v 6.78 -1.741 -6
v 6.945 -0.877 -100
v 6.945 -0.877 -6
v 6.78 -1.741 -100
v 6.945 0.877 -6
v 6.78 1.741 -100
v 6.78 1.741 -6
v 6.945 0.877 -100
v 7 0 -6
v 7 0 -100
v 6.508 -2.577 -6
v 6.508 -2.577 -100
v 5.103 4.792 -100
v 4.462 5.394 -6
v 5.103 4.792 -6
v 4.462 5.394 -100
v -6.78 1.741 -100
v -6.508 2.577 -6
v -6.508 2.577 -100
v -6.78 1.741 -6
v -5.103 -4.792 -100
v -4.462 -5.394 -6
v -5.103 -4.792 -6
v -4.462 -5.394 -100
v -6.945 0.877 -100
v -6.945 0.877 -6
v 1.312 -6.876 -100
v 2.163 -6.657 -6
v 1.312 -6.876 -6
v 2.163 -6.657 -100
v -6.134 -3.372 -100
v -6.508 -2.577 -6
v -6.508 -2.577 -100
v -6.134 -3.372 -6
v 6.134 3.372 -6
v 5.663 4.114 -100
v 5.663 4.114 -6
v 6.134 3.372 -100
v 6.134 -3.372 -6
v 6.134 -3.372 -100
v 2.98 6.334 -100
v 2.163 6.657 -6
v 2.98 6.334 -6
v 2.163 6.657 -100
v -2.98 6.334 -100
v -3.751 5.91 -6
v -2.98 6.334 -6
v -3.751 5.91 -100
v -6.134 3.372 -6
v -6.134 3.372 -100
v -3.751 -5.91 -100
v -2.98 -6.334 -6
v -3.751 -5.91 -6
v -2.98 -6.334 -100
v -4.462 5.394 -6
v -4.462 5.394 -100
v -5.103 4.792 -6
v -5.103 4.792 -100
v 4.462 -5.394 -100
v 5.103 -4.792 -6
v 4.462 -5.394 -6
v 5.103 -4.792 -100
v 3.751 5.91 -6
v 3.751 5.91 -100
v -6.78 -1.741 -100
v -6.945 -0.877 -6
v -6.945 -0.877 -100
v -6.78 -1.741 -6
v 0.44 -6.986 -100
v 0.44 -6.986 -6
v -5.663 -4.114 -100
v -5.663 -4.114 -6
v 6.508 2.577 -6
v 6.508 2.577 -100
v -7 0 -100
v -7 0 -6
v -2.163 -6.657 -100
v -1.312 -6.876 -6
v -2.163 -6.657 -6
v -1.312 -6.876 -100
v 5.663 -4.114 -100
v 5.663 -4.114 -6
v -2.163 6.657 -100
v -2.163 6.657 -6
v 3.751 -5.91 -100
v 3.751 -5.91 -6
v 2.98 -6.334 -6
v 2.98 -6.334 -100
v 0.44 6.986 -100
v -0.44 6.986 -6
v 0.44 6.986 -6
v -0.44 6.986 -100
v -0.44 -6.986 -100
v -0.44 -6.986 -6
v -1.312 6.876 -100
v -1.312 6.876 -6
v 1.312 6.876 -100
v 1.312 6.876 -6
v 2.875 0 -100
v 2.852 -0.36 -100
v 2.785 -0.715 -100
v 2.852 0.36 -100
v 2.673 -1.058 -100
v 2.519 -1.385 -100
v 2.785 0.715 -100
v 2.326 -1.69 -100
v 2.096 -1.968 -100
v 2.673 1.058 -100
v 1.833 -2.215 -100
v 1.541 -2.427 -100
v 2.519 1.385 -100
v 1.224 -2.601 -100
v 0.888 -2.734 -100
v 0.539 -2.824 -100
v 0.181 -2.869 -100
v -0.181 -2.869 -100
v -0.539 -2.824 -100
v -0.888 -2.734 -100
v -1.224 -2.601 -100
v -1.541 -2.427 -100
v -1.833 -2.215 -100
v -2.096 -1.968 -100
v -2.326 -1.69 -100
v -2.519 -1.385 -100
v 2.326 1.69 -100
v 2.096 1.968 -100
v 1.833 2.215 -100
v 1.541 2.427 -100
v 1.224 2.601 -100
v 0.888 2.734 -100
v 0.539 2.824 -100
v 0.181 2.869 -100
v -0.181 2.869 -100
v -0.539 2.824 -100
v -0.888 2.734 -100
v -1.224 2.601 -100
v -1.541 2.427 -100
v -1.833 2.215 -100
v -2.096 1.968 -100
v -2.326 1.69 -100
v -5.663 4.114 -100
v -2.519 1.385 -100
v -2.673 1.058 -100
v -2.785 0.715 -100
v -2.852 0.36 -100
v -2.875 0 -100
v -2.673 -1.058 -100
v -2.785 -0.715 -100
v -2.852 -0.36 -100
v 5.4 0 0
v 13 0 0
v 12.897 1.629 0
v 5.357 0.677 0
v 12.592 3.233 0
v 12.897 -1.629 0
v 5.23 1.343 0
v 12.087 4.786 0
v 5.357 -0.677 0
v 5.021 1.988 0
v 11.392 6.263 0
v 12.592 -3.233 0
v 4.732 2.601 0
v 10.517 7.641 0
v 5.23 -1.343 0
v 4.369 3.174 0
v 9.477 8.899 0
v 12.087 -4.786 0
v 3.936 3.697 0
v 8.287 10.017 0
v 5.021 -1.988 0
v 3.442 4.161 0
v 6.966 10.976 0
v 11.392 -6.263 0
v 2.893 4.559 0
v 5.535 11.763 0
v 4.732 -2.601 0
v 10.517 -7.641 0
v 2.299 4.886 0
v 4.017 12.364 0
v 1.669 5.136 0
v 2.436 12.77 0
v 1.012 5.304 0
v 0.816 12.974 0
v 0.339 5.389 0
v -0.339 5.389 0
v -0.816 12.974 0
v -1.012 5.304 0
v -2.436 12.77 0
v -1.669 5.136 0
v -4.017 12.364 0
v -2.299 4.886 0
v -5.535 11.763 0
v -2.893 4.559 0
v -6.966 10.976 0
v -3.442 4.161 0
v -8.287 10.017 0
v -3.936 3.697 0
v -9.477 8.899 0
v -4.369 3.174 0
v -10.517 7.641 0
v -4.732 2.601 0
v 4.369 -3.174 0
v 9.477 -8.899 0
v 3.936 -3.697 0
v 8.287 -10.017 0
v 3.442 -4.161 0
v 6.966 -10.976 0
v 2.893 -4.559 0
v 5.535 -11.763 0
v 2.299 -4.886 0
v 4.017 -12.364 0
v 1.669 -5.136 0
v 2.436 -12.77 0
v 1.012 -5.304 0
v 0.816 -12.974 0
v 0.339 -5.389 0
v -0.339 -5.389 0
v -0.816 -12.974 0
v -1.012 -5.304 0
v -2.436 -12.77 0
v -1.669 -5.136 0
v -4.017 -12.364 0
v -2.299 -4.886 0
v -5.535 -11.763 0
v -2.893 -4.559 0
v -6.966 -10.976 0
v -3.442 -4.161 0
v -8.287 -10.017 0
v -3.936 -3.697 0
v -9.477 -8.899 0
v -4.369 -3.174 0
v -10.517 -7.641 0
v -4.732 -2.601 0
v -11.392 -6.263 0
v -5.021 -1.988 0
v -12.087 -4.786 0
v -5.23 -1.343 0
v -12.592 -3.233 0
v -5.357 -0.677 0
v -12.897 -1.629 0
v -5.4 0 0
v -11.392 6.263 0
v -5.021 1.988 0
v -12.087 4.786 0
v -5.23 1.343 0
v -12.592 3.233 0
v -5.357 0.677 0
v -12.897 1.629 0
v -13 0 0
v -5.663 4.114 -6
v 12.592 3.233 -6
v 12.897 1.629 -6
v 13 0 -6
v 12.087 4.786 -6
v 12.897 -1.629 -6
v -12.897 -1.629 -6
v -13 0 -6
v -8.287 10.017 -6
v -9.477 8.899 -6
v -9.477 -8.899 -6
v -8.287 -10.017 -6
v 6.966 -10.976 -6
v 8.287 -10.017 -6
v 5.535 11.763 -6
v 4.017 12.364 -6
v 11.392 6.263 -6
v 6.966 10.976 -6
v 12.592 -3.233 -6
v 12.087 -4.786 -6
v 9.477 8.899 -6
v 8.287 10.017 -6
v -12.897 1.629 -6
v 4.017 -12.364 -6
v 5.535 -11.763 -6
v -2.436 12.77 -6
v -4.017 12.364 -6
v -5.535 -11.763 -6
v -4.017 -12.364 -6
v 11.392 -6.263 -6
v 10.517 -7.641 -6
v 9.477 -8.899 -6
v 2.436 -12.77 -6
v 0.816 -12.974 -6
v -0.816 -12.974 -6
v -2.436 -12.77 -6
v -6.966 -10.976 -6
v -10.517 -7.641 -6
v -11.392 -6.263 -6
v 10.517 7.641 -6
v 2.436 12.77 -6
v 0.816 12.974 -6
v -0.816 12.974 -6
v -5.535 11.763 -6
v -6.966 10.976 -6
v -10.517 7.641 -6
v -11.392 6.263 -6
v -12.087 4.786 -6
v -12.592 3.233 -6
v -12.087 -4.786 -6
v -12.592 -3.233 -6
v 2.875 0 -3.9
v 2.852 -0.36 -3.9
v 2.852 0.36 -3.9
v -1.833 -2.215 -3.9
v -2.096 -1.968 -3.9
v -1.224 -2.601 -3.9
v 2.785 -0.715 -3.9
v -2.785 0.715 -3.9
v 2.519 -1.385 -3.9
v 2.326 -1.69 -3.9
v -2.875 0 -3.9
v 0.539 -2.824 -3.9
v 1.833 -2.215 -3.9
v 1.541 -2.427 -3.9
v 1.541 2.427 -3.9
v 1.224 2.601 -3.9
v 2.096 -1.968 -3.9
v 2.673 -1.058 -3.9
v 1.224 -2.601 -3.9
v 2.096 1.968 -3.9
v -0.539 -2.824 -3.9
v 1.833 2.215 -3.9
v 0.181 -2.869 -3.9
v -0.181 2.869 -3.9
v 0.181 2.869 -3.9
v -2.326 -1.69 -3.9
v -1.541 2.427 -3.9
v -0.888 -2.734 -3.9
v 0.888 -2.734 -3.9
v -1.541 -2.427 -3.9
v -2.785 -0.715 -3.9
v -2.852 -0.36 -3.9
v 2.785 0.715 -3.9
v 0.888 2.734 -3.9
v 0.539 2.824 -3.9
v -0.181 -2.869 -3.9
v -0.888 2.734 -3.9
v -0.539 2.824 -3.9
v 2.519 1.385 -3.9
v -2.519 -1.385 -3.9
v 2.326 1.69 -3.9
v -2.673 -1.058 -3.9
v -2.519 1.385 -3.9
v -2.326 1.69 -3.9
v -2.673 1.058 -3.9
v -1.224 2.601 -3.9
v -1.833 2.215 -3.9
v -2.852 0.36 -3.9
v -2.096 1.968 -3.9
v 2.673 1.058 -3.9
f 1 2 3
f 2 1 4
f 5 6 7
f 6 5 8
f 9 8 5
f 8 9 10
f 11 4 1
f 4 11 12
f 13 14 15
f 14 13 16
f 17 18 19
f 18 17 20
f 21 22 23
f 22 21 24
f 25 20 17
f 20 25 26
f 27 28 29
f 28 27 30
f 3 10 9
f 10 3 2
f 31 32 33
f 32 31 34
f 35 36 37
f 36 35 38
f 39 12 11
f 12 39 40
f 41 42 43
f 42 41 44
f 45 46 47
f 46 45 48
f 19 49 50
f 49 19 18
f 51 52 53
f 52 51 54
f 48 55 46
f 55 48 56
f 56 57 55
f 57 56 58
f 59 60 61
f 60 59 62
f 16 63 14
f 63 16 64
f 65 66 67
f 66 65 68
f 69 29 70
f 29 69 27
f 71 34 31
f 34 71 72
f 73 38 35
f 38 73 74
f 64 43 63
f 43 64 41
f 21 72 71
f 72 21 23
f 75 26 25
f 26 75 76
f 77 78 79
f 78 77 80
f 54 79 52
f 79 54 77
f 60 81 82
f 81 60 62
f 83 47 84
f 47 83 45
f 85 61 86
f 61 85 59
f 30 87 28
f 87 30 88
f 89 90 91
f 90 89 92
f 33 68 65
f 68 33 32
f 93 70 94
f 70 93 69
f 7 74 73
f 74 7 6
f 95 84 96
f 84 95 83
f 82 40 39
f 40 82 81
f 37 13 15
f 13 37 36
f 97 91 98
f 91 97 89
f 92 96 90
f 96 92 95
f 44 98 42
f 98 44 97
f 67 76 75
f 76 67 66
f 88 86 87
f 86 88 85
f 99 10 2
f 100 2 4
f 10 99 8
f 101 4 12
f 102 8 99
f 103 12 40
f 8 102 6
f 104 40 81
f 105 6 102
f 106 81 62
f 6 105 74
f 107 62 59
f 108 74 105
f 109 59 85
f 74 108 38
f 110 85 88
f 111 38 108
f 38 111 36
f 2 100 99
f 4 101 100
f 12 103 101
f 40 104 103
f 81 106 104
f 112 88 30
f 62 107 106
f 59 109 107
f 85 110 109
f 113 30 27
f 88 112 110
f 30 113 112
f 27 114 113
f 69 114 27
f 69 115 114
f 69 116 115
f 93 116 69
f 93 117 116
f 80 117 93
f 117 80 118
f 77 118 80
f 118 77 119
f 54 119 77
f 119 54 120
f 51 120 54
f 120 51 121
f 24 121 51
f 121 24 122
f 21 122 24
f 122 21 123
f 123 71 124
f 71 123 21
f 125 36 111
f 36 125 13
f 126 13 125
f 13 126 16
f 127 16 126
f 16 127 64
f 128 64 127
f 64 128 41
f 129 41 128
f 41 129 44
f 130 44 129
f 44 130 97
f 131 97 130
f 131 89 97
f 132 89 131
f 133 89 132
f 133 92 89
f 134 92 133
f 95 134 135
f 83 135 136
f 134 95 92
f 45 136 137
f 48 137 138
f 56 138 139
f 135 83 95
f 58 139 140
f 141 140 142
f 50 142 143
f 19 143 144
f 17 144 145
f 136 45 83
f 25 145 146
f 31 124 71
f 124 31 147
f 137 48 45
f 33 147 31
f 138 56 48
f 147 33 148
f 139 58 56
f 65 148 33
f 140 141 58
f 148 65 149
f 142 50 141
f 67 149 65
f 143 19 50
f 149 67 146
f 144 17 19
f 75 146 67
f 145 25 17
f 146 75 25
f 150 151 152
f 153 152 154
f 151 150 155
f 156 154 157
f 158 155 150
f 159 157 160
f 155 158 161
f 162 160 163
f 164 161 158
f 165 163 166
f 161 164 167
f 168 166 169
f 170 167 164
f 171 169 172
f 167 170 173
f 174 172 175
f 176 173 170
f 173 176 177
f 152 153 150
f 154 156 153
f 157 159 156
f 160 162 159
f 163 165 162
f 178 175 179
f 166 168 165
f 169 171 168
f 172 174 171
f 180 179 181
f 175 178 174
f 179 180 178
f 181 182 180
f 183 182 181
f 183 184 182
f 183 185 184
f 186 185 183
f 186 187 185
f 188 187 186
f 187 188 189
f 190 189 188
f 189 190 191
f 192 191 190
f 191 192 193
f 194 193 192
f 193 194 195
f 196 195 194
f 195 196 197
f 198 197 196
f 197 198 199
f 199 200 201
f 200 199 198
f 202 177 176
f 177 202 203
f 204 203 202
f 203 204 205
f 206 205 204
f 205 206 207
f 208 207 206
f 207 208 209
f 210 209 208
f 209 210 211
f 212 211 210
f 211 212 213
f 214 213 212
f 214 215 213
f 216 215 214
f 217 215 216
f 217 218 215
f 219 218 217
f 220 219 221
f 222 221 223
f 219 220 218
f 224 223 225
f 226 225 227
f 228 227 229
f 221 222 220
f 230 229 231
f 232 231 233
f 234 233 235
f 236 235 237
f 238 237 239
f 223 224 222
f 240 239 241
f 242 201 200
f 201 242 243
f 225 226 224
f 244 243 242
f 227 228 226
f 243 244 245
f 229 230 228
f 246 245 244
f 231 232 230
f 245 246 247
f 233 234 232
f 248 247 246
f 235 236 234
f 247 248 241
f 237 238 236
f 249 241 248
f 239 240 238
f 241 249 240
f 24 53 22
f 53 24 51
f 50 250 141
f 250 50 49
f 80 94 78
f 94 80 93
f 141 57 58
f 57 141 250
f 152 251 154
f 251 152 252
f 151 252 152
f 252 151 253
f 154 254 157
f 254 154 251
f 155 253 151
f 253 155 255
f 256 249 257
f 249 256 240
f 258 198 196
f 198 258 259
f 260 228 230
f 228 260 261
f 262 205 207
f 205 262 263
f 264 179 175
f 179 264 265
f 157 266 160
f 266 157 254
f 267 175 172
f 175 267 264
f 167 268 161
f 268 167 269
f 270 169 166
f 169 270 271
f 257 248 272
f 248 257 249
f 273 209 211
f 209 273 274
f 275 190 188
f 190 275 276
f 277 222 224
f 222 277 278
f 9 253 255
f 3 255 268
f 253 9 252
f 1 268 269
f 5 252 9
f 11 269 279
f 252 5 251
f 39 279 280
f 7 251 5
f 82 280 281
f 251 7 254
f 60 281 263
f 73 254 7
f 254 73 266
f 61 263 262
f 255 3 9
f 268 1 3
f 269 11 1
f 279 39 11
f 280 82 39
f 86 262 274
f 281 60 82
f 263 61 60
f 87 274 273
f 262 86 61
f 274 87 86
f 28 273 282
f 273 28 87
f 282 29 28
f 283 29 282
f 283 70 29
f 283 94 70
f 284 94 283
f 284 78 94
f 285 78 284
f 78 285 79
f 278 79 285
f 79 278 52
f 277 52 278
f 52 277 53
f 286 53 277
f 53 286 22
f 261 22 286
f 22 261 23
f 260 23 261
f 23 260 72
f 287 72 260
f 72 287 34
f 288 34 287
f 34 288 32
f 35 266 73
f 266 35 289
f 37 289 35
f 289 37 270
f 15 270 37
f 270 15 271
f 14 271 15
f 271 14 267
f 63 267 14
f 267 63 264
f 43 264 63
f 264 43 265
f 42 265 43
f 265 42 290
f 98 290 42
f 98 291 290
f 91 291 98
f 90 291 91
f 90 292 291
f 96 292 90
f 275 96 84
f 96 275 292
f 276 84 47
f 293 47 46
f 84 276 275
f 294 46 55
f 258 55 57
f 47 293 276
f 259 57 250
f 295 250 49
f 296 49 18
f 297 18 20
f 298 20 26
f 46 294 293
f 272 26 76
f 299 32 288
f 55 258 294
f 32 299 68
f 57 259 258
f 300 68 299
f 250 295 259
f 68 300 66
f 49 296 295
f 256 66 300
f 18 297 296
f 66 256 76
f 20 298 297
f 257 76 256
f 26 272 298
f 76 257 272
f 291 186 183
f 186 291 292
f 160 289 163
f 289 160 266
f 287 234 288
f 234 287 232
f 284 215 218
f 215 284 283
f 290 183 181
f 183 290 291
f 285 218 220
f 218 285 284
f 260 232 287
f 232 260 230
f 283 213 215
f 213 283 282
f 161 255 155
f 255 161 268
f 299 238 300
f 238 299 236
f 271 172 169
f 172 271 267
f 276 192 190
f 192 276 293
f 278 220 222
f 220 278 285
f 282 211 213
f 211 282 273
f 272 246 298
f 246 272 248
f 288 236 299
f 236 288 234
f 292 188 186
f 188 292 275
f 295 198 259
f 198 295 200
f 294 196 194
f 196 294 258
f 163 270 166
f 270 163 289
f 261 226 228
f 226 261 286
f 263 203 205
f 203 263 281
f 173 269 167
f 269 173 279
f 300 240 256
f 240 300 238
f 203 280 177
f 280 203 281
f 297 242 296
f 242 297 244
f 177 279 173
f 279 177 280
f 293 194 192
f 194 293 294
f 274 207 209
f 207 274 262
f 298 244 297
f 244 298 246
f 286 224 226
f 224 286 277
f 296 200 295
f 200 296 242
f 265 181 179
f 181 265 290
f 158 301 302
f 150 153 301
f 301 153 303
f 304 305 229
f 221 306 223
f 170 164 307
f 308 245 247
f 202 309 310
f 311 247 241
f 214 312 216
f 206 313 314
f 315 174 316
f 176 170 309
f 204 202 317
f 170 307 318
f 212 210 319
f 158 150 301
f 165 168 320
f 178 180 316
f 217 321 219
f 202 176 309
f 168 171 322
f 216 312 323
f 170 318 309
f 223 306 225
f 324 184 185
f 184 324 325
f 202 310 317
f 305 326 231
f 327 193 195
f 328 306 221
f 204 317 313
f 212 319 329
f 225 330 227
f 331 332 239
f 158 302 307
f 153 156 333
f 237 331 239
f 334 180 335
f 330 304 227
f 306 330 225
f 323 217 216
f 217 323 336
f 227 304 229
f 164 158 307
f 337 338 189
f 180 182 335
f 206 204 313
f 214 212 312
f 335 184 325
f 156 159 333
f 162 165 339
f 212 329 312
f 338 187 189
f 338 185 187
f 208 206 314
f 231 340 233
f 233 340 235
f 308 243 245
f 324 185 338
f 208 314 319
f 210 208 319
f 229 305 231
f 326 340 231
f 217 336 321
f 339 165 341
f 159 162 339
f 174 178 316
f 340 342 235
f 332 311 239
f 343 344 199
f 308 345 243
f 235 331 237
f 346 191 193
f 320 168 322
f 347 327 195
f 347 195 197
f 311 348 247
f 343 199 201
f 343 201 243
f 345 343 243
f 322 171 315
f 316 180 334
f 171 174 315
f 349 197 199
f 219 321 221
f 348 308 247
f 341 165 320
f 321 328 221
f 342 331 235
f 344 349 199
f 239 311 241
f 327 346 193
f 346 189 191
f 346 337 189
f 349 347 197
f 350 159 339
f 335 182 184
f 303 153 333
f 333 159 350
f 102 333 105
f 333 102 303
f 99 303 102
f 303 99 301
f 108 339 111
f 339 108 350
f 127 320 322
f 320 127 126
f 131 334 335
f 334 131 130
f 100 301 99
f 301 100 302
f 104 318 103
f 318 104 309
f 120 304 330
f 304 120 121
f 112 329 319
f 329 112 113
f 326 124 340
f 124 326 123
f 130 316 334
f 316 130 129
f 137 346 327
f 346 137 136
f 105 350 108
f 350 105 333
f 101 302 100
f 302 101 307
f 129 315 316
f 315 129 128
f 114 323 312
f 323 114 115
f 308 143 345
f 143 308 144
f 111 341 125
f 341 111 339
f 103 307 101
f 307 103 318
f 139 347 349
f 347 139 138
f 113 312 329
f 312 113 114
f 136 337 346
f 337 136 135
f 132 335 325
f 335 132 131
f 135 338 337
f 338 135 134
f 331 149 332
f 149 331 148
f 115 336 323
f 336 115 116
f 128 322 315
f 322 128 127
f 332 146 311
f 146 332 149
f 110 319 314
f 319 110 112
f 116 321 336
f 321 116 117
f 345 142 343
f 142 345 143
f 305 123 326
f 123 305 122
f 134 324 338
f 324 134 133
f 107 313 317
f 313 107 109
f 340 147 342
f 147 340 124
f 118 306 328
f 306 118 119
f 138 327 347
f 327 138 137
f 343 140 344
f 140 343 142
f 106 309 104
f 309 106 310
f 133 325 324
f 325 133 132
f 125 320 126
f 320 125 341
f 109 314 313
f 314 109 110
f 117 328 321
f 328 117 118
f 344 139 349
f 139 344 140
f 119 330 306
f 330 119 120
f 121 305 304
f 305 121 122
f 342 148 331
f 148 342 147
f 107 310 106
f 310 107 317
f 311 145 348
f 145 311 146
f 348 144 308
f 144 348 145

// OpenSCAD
$fn = 50;


difference() {
	union() {
		translate(v = [0, 0, -100.0000000000]) {
			cylinder(h = 100, r = 7.0000000000);
		}
		translate(v = [0, 0, -6.0000000000]) {
			cylinder(h = 6, r = 13.0000000000);
		}
	}
	union() {
		translate(v = [0, 0, 0]) {
			rotate(a = [0, 0, 0]) {
				difference() {
					union() {
						#translate(v = [0, 0, -100.0000000000]) {
							cylinder(h = 100, r = 2.6000000000);
						}
						#translate(v = [0, 0, -3.9000000000]) {
							cylinder(h = 3.9000000000, r = 7.0000000000, r1 = 2.8750000000, r2 = 5.4000000000);
						}
						#translate(v = [0, 0, -100.0000000000]) {
							cylinder(h = 100, r = 2.8750000000);
						}
						#translate(v = [0, 0, -100.0000000000]) {
							cylinder(h = 100, r = 2.6000000000);
						}
					}
					union();
				}
			}
		}
	}
}
